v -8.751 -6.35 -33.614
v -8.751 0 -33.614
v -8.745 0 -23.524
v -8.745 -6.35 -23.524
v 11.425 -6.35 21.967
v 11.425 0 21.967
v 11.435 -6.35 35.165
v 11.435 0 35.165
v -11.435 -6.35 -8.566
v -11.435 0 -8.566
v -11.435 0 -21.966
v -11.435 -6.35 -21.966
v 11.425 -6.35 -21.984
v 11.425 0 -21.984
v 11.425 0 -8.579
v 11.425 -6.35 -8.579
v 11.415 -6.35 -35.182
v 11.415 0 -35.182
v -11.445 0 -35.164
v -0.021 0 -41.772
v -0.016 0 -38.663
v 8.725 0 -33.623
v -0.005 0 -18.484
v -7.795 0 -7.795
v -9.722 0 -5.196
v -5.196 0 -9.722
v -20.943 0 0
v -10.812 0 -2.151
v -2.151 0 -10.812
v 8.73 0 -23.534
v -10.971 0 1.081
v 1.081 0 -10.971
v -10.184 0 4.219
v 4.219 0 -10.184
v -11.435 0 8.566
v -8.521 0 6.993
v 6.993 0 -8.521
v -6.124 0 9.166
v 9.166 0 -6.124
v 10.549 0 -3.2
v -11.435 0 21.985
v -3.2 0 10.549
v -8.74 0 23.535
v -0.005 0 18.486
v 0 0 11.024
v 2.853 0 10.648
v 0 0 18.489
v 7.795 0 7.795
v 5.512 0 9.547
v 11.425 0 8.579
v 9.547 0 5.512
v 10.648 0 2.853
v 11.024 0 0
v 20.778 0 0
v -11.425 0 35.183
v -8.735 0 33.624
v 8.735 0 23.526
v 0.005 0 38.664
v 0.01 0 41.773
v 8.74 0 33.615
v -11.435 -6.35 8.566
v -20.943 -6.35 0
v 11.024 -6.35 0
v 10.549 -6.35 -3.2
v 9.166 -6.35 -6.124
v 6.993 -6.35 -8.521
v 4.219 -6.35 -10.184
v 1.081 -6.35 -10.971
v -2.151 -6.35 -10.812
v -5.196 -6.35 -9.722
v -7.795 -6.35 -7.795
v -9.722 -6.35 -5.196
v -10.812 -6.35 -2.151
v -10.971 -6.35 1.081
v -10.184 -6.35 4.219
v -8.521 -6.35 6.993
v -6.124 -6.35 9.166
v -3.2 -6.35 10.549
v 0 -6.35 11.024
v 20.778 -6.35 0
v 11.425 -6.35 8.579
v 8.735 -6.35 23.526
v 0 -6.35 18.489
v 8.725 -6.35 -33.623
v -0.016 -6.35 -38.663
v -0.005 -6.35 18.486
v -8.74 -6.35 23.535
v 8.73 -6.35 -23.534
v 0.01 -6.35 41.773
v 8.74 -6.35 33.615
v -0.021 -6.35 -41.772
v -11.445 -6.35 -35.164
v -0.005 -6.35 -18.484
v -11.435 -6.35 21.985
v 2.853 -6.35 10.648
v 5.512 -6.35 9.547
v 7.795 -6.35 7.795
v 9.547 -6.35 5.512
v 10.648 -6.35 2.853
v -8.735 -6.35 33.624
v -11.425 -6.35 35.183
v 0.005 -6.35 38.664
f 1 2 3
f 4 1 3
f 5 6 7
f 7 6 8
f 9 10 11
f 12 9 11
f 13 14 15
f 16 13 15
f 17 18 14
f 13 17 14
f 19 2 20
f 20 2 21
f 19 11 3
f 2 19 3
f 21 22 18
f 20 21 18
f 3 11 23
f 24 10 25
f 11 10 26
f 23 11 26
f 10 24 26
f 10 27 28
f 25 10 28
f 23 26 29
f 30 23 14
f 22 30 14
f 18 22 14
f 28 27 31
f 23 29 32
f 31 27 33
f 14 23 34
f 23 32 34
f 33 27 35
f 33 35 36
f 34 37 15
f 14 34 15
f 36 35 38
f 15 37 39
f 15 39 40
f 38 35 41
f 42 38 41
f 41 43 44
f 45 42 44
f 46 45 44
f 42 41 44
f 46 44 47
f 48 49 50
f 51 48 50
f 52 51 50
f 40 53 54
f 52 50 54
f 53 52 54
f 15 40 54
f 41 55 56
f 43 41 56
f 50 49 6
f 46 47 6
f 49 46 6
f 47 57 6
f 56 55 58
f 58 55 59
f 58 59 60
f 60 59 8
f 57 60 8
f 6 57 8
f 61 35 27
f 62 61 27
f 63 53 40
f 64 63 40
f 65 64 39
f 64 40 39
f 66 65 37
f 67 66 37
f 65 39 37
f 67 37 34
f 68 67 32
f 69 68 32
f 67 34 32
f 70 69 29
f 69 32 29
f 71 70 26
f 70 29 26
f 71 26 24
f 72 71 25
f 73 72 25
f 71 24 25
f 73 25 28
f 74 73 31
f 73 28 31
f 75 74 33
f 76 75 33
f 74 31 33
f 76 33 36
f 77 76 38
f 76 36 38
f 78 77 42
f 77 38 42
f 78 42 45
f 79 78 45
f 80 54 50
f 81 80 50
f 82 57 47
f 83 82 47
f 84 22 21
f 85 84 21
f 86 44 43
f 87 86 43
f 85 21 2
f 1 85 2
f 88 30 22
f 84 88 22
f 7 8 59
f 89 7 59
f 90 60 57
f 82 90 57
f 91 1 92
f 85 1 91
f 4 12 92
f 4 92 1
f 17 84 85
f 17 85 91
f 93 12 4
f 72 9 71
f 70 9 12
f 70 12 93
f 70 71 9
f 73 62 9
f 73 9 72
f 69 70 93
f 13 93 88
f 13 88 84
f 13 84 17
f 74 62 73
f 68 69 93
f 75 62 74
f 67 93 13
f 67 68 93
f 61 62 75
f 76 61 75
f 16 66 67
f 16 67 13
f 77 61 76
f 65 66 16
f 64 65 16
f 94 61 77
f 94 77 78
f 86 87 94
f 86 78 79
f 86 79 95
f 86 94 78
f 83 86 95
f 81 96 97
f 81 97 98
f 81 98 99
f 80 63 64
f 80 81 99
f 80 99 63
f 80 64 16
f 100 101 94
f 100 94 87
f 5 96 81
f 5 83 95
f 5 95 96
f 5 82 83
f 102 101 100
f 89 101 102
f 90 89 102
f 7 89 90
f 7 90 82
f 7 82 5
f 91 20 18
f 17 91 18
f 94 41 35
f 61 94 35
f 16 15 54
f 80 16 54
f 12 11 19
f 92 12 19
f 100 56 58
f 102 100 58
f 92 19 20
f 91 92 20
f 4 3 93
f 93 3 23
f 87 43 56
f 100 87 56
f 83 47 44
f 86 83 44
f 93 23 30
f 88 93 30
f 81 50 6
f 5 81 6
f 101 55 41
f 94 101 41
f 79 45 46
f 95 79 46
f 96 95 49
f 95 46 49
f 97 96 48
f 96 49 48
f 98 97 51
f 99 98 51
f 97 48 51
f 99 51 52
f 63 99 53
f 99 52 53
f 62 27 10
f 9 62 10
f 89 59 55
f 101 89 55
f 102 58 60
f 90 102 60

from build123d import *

# Parameters (mm, degrees)
F1_DEPTH = 6.35


with BuildPart() as f1:
    # F0 (on Front) → F1 (new body)
    with BuildSketch(Plane.XZ):
        with BuildLine():
            ThreePointArc((0, 11.0236), (-7.794862, -7.794862), (11.0236, 0))
            ThreePointArc((11.0236, 0), (7.794862, 7.794862), (0, 11.0236))
        make_face()
        with BuildLine():
            ThreePointArc((11.424853, 8.579359), (6.385729, 12.781045), (0, 14.2875))
            ThreePointArc((0, 14.2875), (-6.393397, 12.777211), (-11.435141, 8.565642))
            ThreePointArc((-11.435141, 8.565642), (-14.2875, 0), (-11.435141, -8.565642))
            ThreePointArc((-11.435141, -8.565642), (-0.008573, -14.287497), (11.424853, -8.579359))
            ThreePointArc((11.424853, -8.579359), (13.552956, -4.522172), (14.2875, 0))
            ThreePointArc((14.2875, 0), (13.552956, 4.522172), (11.424853, 8.579359))
        make_face()
        with BuildLine():
            ThreePointArc((0, 11.0236), (7.794862, 7.794862), (11.0236, 0))
            ThreePointArc((11.0236, 0), (-7.794862, -7.794862), (0, 11.0236))
        make_face(mode=Mode.SUBTRACT)
        with BuildLine():
            ThreePointArc((-11.435141, 8.565642), (-6.393397, 12.777211), (0, 14.2875))
            Line((0, 14.2875), (0, 15.382706))
            Line((0, 15.382706), (-0.010288, 15.376777))
            Line((-0.010288, 15.376777), (-11.435141, 21.984798))
            Line((-11.435141, 21.984798), (-11.435141, 8.565642))
        make_face()
        with BuildLine():
            Line((0, 15.382706), (0, 14.2875))
            ThreePointArc((0, 14.2875), (6.385729, 12.781045), (11.424853, 8.579359))
            Line((11.424853, 8.579359), (11.424853, 21.966979))
            Line((11.424853, 21.966979), (0, 15.382706))
        make_face()
        with BuildLine():
            Line((20.778073, 0), (11.424853, 8.579359))
            ThreePointArc((11.424853, 8.579359), (13.552956, 4.522172), (14.2875, 0))
            ThreePointArc((14.2875, 0), (13.552956, -4.522172), (11.424853, -8.579359))
            Line((11.424853, -8.579359), (20.778073, 0))
        make_face()
        with BuildLine():
            ThreePointArc((-11.435141, -8.565642), (-14.2875, 0), (-11.435141, 8.565642))
            Line((-11.435141, 8.565642), (-20.943042, 0))
            Line((-20.943042, 0), (-11.435141, -8.565642))
        make_face()
        Polygon((-0.005462, 18.48569), (0, 18.48884), (8.734868, 23.525615), (8.74033, 33.614925), (0.005462, 38.66431), (-8.734868, 33.624385), (-8.74033, 23.535075), align=None)
        Polygon((-0.010288, 15.376777), (0, 15.382706), (11.424853, 21.966979), (11.435141, 35.165202), (0.010288, 41.773223), (-11.424853, 35.183021), (-11.435141, 21.984798), align=None)
        Polygon((8.734868, 23.525615), (0, 18.48884), (-0.005462, 18.48569), (-8.74033, 23.535075), (-8.734868, 33.624385), (0.005462, 38.66431), (8.74033, 33.614925), align=None, mode=Mode.SUBTRACT)
        with BuildLine():
            ThreePointArc((11.424853, -8.579359), (-0.008573, -14.287497), (-11.435141, -8.565642))
            Line((-11.435141, -8.565642), (-11.435141, -21.965788))
            Line((-11.435141, -21.965788), (0, -15.375586))
            Line((0, -15.375586), (11.424853, -21.983607))
            Line((11.424853, -21.983607), (11.424853, -8.579359))
        make_face()
        Polygon((0, -15.375586), (-11.435141, -21.965788), (-11.445428, -35.164011), (-0.020576, -41.772032), (11.414565, -35.181831), (11.424853, -21.983607), align=None)
        Polygon((-0.004826, -18.484499), (8.730042, -23.533885), (8.72458, -33.623195), (-0.01575, -38.663119), (-8.750618, -33.613734), (-8.745156, -23.524424), align=None, mode=Mode.SUBTRACT)
    extrude(amount=F1_DEPTH)


solid = f1.part
